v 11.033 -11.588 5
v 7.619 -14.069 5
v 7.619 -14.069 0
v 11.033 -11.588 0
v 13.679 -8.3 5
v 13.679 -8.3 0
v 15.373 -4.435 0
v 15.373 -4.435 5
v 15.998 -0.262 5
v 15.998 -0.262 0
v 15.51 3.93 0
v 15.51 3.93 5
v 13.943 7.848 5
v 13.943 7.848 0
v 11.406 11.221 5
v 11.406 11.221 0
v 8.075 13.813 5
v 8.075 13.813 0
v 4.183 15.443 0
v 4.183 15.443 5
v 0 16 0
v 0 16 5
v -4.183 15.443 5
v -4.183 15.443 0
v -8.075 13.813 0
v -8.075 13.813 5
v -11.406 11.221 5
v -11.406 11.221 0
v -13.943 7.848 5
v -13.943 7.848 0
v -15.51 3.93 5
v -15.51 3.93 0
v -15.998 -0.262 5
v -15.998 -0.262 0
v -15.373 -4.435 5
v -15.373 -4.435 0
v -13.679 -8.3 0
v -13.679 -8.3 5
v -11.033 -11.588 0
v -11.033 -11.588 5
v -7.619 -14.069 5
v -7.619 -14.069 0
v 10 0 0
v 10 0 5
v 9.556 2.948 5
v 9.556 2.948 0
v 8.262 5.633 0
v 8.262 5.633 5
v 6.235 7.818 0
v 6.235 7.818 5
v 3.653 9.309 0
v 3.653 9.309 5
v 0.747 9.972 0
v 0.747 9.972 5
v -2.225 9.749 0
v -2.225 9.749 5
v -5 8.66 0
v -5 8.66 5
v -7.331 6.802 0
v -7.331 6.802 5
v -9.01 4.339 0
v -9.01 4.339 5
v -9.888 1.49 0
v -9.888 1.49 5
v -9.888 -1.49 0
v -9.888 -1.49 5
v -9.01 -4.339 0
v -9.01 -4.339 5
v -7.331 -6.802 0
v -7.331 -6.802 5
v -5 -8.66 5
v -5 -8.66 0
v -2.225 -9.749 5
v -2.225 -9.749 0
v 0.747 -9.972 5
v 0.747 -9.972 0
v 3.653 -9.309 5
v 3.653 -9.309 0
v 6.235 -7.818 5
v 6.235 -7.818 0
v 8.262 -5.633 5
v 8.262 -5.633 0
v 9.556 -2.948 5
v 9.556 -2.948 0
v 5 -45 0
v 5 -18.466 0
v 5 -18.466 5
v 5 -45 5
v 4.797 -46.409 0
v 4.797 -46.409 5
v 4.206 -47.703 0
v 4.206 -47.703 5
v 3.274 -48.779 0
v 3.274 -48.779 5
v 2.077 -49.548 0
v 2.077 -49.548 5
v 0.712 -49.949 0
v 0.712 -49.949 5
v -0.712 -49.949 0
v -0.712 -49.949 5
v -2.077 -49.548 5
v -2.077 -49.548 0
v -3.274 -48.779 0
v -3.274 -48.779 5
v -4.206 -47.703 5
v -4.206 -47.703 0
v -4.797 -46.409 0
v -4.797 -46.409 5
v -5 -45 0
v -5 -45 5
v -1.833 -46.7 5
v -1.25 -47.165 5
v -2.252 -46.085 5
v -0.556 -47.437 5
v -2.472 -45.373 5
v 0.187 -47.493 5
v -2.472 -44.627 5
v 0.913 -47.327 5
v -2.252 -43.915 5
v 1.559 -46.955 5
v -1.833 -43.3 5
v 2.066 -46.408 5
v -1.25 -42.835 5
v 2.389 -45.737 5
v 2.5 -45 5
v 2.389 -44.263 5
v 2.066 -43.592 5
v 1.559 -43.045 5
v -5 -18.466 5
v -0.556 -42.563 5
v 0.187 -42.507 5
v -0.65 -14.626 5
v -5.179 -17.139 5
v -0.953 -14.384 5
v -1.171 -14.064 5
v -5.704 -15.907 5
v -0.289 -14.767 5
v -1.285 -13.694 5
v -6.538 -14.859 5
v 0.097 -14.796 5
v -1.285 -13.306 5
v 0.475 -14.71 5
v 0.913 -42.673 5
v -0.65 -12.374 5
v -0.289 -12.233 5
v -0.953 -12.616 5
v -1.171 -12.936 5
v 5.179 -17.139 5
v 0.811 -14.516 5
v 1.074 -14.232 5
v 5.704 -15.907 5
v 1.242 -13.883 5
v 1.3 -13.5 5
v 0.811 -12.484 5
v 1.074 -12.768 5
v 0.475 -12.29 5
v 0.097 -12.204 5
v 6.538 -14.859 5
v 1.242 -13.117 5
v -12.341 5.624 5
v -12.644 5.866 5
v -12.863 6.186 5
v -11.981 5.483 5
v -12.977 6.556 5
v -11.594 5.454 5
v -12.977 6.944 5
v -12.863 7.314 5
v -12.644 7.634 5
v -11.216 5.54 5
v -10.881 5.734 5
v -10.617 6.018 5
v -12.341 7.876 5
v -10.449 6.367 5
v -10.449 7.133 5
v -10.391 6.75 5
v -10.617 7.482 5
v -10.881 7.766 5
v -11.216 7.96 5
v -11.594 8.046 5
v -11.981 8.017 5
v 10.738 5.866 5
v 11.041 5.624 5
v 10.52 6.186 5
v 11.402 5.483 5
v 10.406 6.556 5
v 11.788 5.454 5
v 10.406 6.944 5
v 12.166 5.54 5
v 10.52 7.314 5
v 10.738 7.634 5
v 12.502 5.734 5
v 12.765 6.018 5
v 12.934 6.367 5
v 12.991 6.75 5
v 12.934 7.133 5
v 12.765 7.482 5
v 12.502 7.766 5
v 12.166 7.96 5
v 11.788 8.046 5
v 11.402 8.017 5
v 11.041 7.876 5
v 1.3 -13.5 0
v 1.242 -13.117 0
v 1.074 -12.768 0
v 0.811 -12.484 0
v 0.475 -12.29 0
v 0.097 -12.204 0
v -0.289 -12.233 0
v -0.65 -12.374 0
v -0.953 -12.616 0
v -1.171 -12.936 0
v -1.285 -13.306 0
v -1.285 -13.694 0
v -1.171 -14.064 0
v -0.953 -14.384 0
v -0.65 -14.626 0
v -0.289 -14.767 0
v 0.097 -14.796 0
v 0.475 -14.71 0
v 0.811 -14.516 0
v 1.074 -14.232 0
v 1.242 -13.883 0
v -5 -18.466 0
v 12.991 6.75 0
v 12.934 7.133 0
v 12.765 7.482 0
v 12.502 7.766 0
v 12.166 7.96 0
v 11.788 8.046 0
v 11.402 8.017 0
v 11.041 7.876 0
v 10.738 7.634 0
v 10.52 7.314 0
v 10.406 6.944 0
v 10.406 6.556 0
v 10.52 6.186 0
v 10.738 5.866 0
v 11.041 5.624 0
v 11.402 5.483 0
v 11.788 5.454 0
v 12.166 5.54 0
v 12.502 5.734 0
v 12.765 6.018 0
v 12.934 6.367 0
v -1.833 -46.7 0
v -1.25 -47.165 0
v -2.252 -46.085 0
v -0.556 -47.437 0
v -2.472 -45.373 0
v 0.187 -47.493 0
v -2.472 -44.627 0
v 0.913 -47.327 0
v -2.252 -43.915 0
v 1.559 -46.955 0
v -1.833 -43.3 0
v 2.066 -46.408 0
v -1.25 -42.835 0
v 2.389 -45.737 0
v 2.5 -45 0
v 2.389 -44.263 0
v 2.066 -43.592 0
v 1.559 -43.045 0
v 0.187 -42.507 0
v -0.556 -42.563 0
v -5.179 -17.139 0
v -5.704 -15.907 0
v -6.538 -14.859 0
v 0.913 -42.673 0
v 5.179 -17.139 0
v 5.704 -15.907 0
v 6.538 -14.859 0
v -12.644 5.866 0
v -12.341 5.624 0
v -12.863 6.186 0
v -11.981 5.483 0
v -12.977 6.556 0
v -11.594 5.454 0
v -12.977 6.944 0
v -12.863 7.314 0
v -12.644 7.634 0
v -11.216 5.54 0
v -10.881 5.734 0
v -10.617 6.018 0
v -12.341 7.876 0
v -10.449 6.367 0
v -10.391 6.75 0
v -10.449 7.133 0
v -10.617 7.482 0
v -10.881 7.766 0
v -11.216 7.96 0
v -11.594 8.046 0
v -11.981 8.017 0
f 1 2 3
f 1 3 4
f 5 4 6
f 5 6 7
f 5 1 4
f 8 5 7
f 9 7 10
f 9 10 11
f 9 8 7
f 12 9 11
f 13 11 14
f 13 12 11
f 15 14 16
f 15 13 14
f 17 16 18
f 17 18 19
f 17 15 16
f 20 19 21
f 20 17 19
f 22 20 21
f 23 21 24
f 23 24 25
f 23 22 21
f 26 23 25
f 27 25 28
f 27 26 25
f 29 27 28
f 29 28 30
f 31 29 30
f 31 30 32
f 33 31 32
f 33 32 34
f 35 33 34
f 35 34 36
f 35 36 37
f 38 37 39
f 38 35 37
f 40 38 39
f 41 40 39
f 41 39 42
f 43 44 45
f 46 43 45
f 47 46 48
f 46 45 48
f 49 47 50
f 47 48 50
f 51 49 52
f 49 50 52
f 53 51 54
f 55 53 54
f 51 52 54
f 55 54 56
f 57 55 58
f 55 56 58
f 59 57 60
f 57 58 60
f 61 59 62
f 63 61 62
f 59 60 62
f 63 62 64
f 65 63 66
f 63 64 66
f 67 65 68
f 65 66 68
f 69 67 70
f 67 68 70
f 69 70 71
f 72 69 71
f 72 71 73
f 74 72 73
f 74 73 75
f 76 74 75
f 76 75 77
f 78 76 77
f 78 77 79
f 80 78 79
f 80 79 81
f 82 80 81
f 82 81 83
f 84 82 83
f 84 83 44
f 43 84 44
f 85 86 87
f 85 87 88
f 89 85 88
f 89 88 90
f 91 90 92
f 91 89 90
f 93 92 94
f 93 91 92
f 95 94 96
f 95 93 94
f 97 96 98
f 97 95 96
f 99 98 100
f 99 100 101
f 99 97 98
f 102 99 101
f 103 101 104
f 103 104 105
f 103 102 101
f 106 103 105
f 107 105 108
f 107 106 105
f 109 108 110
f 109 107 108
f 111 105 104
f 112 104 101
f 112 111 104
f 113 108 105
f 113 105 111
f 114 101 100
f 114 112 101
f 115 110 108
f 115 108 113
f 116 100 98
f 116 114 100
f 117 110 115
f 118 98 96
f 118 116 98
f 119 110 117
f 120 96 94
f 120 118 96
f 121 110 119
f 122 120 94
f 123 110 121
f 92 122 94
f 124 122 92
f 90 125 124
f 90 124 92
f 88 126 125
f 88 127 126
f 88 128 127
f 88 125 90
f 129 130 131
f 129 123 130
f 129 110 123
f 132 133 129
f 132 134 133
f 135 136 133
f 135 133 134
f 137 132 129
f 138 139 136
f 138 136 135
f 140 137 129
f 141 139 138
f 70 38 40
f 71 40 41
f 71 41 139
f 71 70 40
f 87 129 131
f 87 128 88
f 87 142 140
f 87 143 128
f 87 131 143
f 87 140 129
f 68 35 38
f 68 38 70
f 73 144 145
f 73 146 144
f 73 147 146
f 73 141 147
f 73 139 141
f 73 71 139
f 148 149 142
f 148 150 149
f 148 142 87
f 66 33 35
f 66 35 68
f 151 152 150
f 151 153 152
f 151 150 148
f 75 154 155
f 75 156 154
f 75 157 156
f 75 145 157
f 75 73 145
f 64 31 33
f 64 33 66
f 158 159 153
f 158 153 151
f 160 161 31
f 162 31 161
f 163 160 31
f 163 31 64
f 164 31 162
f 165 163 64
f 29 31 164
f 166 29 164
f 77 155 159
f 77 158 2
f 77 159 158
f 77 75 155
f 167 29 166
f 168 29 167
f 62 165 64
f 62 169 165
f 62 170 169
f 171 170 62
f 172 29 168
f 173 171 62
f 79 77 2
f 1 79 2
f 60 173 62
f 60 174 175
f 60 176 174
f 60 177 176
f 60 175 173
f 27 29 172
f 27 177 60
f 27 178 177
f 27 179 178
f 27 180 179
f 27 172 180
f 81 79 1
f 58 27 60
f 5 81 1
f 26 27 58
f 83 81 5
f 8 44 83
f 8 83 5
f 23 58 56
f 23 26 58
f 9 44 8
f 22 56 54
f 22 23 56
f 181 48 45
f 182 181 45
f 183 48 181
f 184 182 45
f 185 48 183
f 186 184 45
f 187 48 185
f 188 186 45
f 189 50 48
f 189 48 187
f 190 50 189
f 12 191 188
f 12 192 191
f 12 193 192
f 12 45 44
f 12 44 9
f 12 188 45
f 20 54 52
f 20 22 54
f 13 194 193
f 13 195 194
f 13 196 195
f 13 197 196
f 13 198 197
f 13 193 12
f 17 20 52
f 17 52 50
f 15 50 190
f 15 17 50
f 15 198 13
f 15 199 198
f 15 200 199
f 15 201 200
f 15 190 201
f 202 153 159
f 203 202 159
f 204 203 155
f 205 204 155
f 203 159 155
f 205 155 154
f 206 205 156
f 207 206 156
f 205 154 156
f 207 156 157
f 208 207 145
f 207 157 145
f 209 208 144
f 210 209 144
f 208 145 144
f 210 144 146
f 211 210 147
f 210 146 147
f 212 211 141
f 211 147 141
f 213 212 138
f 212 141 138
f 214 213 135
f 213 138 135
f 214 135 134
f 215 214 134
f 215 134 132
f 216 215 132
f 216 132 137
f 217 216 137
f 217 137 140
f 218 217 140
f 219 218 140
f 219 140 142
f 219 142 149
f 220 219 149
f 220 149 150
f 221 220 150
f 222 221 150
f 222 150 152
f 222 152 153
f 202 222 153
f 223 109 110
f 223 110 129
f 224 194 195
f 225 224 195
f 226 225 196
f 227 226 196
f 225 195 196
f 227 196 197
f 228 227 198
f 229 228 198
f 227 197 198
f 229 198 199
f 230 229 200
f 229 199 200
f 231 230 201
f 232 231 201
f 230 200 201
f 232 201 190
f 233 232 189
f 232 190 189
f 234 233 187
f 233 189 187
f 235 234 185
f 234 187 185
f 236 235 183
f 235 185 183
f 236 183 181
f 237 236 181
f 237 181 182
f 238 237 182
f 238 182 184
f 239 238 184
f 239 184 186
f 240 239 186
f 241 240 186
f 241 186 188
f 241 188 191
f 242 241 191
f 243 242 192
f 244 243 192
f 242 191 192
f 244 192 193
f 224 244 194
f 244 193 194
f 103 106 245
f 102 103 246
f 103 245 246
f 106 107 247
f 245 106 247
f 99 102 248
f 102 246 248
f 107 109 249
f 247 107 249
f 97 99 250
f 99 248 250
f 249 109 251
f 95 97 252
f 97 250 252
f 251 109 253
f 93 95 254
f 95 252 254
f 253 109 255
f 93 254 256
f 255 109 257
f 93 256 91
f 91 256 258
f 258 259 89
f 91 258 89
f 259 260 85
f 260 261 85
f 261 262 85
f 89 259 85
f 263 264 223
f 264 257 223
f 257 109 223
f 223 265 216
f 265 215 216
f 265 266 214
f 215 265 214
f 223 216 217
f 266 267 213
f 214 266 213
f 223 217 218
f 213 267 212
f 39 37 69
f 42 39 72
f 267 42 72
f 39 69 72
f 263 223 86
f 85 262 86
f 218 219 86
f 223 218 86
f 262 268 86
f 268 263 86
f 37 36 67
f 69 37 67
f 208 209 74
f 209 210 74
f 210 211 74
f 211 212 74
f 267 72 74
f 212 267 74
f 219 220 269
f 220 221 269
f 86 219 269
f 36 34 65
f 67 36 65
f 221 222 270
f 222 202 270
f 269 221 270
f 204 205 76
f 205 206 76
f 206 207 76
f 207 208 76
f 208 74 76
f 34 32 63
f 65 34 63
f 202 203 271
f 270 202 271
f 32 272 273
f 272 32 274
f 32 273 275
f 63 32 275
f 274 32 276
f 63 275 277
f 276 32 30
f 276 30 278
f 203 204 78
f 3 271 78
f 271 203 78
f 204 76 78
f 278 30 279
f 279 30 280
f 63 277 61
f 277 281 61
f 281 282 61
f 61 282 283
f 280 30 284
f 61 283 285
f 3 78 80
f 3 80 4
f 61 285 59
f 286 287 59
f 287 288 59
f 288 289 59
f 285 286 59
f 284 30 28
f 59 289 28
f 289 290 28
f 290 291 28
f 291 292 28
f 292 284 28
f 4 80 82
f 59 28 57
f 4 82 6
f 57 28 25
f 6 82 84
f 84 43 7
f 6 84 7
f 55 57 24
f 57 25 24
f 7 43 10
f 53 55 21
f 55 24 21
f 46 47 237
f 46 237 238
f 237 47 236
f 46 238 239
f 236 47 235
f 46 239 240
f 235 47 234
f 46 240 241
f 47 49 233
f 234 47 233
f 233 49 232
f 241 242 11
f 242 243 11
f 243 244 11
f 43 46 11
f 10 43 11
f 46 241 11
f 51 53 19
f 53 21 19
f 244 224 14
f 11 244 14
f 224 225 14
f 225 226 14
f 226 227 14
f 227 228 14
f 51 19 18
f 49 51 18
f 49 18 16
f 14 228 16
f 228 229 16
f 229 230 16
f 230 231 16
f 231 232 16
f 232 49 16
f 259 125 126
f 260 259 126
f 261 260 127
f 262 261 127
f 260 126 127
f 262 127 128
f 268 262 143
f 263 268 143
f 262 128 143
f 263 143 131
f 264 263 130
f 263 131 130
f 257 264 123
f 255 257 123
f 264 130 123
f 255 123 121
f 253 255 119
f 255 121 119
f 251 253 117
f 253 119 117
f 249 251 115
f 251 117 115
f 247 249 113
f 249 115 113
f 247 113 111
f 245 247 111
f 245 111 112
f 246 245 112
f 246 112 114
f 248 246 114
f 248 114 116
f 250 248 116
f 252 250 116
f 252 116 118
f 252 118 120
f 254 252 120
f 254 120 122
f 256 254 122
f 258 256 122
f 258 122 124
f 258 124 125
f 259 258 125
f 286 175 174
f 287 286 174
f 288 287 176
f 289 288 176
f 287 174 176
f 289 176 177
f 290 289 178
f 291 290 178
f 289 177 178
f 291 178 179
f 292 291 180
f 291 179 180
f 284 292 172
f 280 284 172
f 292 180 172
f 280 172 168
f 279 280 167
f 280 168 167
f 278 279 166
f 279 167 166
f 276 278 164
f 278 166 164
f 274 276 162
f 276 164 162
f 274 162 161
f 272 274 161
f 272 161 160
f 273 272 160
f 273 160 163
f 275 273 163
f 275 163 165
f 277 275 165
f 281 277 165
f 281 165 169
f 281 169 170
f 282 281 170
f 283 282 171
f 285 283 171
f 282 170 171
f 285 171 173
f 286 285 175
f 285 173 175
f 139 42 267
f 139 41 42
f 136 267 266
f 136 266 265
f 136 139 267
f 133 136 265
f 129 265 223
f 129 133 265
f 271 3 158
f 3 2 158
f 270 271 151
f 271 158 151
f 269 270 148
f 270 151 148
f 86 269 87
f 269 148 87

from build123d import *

# Parameters (mm, degrees)
EXTRUDE_1_DEPTH     = 5
SKETCH_3_R          = 2.5
CUT_EXTRUDE_1_DEPTH = 24
SKETCH_4_R          = 1.525
CUT_EXTRUDE_2_DEPTH = 5
SKETCH_5_R          = 2.5
CUT_EXTRUDE_3_DEPTH = 5
FILLET_1_R          = 5
SKETCH_6_R          = 1.3
SKETCH_6_R_2        = 10
CUT_EXTRUDE_4_DEPTH = 10
SKETCH_7_R          = 16
SKETCH_7_R_2        = 10
SKETCH_7_R_3        = 1.3
EXTRUDE_2_DEPTH     = 5
FILLET_2_R          = 5


with BuildPart() as part:
    # 草图1 → 凸台-拉伸1 (new body)
    with BuildSketch(Plane.XY):
        with BuildLine():
            Line((5, -8.077747211), (5, -45))
            ThreePointArc((5, -45), (0, -50), (-5, -45))
            Line((-5, -45), (-5, -8.077747211))
            ThreePointArc((-5, -8.077747211), (0, 9.5), (5, -8.077747211))
        make_face()
    extrude(amount=EXTRUDE_1_DEPTH)

    # 草图3 → 切除-拉伸1 (cut)
    with BuildSketch(Plane.XY.offset(5)):
        with Locations((0, -45)):
            Circle(SKETCH_3_R)
    extrude(amount=-CUT_EXTRUDE_1_DEPTH, mode=Mode.SUBTRACT)

    # 草图4 → 切除-拉伸2 (cut)
    with BuildSketch(Plane.XY.offset(5)):
        with Locations((0, 6.25)):
            Circle(SKETCH_4_R)
        with Locations((0, -6.25)):
            Circle(SKETCH_4_R)
    extrude(amount=-CUT_EXTRUDE_2_DEPTH, mode=Mode.SUBTRACT)

    # 草图5 → 切除-拉伸3 (cut)
    with BuildSketch(Plane.XY.offset(5)):
        Circle(SKETCH_5_R)
    extrude(amount=-CUT_EXTRUDE_3_DEPTH, mode=Mode.SUBTRACT)

    # 圆角1
    fillet_1_edges = [part.edges().sort_by_distance(p)[0] for p in [
        (-5, -8.077747211, 2.5),
        (5, -8.077747211, 2.5),
    ]]
    fillet(fillet_1_edges, radius=FILLET_1_R)

    # 草图6 → 切除-拉伸4 (cut)
    with BuildSketch(Plane.XY.offset(5)):
        with Locations((0, -13.5)):
            Circle(SKETCH_6_R)
        Circle(SKETCH_6_R_2)
    extrude(amount=-CUT_EXTRUDE_4_DEPTH, mode=Mode.SUBTRACT)

    # 草图7 → 凸台-拉伸2 (add)
    with BuildSketch(Plane.XY.offset(5)):
        Circle(SKETCH_7_R)
        Circle(SKETCH_7_R_2, mode=Mode.SUBTRACT)
        with Locations((11.691342951, 6.75)):
            Circle(SKETCH_7_R_3, mode=Mode.SUBTRACT)
        with Locations((-11.691342951, 6.75)):
            Circle(SKETCH_7_R_3, mode=Mode.SUBTRACT)
        with Locations((0, -13.5)):
            Circle(SKETCH_7_R_3, mode=Mode.SUBTRACT)
    extrude(amount=-EXTRUDE_2_DEPTH)

    # 圆角2
    fillet_2_edges = [part.edges().sort_by_distance(p)[0] for p in [
        (5, -15.198684154, 2.5),
        (-5, -15.198684154, 2.5),
    ]]
    fillet(fillet_2_edges, radius=FILLET_2_R)


solid = part.part
